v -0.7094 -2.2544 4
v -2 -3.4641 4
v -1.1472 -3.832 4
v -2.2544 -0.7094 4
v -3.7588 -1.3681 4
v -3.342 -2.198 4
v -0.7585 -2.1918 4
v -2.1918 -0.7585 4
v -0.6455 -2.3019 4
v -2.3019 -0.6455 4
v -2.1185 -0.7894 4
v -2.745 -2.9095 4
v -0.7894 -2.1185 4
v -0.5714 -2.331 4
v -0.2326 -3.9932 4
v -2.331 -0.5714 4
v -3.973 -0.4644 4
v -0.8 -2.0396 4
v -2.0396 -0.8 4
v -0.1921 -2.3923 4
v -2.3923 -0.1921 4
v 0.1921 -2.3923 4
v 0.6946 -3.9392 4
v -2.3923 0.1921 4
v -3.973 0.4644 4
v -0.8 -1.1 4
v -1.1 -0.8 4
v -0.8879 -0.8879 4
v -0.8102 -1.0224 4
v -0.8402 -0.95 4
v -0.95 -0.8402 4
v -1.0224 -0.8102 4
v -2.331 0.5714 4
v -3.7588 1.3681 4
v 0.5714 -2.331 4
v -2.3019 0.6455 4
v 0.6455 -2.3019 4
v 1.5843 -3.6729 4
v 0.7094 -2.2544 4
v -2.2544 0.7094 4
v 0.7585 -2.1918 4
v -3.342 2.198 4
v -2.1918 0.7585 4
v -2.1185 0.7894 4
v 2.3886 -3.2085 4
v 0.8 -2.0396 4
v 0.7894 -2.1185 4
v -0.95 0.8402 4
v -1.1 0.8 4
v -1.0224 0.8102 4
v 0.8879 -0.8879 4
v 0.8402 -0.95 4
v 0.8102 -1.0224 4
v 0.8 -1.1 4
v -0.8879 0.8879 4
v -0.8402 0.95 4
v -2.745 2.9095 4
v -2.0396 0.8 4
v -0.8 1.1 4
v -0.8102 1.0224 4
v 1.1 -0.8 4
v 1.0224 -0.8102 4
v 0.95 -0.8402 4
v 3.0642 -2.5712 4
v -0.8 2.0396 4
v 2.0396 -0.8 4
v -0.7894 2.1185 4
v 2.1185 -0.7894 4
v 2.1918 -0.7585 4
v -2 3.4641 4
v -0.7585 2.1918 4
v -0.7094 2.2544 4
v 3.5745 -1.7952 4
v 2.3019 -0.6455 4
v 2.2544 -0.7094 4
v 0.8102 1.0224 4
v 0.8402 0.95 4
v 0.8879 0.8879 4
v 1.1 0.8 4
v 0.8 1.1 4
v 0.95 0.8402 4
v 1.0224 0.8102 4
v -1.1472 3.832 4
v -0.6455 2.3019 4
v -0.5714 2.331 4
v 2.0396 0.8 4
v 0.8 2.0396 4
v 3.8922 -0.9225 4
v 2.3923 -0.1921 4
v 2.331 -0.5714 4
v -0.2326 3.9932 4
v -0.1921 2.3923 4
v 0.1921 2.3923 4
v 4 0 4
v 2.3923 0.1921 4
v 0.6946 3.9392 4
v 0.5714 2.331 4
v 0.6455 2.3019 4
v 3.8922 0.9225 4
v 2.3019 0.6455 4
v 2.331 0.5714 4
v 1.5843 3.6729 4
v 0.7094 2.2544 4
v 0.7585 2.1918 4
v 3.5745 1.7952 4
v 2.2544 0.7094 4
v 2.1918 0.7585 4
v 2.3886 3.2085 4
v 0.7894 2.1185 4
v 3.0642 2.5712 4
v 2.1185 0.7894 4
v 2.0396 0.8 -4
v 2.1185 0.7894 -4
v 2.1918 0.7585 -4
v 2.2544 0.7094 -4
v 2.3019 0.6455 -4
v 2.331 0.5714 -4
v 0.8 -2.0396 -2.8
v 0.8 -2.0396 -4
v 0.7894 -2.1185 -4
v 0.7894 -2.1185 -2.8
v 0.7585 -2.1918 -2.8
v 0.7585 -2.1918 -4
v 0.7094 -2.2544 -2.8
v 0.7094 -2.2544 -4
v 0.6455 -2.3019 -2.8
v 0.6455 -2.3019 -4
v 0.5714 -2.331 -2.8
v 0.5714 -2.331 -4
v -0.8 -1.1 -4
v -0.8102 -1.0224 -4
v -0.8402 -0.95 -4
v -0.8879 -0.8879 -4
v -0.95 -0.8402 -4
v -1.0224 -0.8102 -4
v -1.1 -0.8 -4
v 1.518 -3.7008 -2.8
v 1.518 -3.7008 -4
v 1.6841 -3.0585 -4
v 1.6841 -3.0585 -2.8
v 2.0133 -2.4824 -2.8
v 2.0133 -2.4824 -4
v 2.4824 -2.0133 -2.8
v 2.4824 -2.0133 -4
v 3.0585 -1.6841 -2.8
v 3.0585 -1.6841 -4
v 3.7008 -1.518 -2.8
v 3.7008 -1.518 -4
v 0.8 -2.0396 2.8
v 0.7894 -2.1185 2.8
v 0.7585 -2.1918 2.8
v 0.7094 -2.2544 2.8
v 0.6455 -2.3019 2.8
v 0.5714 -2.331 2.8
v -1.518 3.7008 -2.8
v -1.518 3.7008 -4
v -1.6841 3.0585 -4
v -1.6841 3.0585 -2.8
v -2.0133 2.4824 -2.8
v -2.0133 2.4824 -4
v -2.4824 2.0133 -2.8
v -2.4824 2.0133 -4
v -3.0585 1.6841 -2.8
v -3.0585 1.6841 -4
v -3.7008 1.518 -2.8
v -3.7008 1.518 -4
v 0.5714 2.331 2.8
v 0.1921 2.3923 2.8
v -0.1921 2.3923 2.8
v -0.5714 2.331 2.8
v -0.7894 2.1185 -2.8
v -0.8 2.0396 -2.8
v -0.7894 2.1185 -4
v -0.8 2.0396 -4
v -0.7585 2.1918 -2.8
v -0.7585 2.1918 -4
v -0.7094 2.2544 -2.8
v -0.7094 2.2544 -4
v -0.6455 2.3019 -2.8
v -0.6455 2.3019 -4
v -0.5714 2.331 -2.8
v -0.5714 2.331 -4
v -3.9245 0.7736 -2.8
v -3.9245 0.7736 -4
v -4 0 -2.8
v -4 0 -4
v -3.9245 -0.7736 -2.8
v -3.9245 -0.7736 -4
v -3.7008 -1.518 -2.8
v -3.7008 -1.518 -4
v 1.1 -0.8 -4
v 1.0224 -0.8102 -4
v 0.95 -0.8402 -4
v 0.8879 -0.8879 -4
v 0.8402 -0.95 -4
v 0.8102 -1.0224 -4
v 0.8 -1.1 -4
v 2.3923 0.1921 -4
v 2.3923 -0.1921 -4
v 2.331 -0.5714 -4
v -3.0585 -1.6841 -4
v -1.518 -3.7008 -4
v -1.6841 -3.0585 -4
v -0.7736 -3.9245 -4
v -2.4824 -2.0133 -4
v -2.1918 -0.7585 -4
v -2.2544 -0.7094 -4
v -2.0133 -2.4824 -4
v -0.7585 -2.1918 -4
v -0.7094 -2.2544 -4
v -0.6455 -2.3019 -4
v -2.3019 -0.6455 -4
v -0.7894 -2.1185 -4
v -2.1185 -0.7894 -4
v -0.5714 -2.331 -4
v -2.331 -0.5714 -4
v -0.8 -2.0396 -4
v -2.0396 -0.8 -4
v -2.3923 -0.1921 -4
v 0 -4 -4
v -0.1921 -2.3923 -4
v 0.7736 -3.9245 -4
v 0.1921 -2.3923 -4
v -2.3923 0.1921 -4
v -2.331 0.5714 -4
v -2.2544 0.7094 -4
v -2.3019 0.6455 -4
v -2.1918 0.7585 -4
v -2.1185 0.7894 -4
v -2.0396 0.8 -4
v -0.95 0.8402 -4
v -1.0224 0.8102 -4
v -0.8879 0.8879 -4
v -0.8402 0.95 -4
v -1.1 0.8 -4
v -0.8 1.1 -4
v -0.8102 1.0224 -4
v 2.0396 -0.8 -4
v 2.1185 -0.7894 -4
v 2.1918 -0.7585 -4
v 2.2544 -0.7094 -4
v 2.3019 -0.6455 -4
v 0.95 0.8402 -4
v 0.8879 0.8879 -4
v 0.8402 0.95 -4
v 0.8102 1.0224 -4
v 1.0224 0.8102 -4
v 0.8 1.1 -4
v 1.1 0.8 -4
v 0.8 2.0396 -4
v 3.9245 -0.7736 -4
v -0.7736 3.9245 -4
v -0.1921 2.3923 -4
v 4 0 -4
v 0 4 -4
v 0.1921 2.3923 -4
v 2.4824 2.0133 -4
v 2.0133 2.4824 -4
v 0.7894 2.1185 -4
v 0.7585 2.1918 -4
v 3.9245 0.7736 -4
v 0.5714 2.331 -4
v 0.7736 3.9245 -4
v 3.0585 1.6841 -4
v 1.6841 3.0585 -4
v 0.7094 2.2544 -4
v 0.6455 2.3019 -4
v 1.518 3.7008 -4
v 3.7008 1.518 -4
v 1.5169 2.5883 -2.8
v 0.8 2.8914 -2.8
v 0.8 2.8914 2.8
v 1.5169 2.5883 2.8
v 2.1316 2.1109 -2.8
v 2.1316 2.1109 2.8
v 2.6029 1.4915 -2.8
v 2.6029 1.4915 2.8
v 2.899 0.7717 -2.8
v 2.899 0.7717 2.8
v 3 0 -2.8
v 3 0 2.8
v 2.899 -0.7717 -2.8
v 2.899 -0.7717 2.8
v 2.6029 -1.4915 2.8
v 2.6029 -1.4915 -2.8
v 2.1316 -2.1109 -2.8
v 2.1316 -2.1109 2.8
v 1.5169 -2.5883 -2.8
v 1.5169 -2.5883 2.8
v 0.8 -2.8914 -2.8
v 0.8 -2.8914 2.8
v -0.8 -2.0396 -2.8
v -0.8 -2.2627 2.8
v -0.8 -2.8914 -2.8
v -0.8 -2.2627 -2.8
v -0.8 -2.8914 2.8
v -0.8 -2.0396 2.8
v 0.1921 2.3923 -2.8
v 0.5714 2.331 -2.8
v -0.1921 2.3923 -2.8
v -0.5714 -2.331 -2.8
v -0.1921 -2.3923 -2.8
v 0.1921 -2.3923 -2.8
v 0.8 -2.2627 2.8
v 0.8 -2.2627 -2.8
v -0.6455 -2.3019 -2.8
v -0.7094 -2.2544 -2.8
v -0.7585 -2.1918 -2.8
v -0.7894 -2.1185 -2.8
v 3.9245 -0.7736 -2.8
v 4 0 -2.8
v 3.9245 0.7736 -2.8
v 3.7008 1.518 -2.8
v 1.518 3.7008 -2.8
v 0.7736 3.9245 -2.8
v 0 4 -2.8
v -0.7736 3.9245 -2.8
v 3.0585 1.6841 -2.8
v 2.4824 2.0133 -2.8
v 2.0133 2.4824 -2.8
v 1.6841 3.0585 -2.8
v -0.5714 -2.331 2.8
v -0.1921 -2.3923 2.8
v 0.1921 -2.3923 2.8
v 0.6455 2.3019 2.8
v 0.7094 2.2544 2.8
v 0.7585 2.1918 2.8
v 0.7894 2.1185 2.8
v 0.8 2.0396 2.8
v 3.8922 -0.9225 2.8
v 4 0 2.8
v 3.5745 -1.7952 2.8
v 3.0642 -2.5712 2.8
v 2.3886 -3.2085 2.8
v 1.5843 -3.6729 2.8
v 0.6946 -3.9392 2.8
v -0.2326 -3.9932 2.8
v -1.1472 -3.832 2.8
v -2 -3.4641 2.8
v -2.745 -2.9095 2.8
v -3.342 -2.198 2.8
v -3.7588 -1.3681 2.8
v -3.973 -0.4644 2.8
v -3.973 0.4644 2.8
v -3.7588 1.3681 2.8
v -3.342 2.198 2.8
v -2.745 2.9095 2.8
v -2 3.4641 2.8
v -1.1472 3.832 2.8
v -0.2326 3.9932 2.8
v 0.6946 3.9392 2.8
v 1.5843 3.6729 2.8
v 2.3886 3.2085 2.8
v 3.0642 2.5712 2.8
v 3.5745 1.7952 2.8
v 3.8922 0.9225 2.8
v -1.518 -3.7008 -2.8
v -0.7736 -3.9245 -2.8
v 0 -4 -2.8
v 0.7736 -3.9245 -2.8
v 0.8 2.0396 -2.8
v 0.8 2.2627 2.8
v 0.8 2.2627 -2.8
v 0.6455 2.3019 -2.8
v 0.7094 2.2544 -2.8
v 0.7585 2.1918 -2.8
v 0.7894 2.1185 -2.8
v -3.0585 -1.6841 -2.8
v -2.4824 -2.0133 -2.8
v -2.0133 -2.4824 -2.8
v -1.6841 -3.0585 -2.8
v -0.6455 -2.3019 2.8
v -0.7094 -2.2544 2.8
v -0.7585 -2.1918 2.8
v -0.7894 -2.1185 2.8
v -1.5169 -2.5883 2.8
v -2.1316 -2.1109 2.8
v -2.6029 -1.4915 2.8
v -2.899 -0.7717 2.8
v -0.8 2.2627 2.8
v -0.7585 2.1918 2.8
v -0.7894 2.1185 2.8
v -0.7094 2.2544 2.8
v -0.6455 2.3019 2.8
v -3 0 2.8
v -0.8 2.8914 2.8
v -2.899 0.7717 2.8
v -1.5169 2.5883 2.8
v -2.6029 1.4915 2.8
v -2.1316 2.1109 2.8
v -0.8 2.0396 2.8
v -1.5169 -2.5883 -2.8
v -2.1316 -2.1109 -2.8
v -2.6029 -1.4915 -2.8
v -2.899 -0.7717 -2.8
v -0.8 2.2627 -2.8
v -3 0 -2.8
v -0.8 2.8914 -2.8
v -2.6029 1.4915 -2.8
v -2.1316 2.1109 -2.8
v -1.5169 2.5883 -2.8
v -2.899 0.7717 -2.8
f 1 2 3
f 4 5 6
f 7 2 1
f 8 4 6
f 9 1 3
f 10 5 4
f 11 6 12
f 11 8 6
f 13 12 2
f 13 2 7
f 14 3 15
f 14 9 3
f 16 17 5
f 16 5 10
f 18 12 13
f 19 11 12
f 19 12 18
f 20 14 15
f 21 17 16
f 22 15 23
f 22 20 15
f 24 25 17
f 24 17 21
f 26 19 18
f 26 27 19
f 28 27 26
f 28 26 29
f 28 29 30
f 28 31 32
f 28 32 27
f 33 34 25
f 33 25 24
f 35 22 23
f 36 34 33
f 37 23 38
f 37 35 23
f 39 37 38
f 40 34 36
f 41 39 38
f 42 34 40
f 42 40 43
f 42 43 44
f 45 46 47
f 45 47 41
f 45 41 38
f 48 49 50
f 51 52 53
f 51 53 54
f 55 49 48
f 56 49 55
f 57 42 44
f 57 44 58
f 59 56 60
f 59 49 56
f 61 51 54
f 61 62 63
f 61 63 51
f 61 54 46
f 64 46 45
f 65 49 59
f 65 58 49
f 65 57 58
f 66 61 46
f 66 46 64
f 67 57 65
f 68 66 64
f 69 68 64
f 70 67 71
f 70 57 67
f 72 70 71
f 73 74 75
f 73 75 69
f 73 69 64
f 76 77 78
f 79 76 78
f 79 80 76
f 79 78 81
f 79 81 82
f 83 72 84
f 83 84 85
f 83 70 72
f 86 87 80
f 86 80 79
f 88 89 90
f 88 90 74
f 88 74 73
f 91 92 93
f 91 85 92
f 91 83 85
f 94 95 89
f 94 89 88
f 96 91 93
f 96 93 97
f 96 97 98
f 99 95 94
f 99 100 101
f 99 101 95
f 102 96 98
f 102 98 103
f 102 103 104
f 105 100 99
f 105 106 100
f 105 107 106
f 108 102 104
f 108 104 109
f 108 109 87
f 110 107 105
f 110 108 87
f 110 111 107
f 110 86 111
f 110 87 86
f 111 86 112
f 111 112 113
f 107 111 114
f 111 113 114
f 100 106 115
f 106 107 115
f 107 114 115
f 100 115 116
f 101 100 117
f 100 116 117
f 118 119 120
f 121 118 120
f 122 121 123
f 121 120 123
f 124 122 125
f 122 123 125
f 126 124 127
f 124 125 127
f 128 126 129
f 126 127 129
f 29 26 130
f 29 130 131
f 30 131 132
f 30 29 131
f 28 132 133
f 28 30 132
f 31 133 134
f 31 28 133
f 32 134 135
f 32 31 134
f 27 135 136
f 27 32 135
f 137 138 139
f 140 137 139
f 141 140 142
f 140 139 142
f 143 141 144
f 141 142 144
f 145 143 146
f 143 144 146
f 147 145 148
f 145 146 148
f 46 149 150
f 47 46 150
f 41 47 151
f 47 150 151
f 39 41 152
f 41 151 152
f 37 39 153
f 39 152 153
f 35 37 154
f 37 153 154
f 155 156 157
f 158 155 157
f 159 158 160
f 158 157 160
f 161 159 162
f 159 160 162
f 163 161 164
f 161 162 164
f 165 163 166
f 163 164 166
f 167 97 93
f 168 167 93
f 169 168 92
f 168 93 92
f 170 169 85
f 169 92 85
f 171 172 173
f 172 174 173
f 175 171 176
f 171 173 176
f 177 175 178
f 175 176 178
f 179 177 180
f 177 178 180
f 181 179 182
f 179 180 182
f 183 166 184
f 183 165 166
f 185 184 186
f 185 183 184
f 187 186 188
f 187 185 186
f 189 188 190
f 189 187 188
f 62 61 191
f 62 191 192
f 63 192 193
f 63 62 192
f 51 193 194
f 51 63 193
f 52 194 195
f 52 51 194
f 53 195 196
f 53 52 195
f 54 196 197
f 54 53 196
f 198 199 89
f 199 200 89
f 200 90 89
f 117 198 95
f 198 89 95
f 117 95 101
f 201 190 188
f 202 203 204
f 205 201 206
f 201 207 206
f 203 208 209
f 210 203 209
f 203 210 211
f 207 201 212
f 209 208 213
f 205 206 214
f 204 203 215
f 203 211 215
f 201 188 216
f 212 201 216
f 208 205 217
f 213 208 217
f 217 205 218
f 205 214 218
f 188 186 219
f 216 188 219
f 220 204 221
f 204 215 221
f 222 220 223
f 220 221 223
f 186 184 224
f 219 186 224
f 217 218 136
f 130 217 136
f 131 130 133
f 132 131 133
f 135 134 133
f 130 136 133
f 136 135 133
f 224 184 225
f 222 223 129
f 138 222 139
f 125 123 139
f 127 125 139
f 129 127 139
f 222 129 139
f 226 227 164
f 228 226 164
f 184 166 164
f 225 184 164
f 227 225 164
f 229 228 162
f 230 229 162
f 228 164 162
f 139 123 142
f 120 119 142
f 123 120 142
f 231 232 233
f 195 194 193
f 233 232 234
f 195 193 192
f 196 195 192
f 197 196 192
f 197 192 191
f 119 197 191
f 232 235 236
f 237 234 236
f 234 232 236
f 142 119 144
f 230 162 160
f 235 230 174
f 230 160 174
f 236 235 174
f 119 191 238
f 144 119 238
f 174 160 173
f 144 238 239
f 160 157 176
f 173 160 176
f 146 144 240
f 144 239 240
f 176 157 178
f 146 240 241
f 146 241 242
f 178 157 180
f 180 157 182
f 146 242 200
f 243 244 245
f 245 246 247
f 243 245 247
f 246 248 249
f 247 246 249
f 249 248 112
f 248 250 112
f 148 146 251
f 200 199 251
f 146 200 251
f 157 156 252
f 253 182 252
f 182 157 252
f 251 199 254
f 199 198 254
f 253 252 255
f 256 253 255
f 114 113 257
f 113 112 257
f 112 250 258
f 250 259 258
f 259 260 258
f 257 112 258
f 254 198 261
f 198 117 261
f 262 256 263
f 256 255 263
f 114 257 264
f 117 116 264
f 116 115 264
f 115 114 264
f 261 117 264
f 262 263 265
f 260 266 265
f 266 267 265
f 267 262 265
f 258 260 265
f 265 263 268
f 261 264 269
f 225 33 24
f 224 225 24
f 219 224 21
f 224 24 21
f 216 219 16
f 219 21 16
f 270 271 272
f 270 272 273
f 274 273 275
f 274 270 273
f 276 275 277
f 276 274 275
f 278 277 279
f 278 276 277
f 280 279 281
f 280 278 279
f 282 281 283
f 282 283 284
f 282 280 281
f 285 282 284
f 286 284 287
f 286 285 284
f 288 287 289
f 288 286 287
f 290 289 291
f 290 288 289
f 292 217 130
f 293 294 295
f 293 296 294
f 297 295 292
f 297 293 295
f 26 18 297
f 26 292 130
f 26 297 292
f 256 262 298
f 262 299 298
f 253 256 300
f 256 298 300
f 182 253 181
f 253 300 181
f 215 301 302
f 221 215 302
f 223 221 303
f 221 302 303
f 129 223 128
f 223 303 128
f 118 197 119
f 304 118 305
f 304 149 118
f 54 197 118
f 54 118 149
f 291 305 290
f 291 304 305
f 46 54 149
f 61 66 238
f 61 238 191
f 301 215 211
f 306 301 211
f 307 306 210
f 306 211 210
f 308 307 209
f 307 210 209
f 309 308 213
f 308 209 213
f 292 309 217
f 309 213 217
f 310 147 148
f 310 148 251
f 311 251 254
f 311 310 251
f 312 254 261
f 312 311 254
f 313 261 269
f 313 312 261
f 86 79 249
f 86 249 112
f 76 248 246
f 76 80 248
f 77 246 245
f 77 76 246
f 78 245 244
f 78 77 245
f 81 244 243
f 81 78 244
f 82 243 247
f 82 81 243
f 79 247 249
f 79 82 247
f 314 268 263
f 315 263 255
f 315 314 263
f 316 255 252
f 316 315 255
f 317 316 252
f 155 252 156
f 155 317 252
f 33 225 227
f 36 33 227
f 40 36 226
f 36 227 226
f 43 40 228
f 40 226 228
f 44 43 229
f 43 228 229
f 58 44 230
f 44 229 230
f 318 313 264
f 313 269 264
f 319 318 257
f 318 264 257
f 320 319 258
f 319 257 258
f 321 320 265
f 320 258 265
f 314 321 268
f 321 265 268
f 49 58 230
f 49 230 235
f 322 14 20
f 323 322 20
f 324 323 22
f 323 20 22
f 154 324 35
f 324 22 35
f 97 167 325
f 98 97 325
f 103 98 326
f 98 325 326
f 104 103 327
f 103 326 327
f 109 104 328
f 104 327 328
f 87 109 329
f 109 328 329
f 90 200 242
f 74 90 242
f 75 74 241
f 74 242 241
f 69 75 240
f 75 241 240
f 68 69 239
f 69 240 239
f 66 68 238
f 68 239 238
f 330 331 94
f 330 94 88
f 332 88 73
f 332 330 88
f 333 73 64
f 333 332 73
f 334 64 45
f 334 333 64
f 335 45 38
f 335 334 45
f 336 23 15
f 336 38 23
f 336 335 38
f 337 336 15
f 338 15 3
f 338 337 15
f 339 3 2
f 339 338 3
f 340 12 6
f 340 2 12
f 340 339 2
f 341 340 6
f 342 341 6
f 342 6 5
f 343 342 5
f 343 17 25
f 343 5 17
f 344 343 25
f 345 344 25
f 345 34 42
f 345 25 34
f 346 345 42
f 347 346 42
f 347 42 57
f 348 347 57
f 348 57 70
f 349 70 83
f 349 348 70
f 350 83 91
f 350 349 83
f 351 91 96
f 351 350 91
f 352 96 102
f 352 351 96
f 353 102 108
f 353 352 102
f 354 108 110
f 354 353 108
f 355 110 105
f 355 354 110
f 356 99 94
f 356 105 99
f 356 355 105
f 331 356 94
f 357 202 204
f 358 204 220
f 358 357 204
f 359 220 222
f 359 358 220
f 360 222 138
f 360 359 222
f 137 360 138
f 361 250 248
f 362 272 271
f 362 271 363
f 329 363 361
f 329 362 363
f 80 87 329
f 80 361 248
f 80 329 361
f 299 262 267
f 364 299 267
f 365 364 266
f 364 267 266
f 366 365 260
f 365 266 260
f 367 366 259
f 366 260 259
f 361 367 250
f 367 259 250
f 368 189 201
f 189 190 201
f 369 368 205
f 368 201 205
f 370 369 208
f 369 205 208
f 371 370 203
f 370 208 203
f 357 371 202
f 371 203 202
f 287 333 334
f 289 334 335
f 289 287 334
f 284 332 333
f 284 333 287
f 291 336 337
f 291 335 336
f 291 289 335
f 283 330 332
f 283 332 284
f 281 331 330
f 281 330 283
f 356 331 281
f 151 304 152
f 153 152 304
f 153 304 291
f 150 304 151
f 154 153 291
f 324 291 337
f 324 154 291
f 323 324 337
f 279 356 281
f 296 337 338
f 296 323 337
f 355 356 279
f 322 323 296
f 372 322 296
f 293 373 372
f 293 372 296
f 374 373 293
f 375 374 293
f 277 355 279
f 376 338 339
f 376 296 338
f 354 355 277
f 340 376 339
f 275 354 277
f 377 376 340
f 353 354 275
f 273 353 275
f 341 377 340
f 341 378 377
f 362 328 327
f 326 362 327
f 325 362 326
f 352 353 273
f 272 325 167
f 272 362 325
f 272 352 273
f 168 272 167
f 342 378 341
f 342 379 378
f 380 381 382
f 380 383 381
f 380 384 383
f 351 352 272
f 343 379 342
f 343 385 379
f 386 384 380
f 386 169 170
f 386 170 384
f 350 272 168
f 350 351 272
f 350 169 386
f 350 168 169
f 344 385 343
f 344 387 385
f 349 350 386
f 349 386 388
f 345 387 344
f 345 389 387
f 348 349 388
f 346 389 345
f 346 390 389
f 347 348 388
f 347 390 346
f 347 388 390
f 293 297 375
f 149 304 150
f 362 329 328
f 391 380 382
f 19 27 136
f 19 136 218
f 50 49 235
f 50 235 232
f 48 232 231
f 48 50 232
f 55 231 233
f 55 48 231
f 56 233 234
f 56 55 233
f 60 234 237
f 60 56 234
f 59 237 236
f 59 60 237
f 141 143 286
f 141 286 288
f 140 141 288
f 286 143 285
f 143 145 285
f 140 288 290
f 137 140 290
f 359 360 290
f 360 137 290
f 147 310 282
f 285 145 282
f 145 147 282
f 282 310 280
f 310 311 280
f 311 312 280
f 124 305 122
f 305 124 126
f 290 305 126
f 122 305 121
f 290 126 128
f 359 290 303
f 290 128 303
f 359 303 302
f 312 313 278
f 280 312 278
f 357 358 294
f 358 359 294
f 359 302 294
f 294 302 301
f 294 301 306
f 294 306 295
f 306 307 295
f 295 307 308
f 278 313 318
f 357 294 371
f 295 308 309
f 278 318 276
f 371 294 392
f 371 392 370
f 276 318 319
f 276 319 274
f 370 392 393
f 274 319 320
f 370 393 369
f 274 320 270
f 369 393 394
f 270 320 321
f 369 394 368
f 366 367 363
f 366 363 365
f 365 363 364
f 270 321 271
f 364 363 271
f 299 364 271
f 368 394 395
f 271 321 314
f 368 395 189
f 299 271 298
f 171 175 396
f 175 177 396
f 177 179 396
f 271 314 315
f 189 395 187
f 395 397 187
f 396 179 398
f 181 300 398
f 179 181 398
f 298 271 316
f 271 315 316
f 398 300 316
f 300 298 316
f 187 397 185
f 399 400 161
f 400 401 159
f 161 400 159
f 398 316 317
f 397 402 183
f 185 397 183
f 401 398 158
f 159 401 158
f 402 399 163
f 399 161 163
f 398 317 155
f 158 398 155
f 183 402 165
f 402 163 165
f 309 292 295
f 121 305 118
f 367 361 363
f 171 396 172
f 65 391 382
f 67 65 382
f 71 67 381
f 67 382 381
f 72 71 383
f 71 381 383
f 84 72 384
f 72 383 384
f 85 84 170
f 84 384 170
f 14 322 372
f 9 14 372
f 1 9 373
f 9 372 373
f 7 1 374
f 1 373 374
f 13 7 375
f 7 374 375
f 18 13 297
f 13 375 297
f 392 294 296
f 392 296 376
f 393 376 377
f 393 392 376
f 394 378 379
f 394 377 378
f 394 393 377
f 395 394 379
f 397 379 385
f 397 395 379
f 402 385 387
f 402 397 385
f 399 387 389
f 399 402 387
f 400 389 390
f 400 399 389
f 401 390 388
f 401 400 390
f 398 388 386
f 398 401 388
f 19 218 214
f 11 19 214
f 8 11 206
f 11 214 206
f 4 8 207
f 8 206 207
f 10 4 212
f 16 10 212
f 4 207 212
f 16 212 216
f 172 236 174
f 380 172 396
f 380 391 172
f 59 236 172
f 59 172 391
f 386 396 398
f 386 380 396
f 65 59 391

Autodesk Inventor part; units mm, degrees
ref_plane "YZ Plane" through (0, 0, 0) normal (1, 0, 0) x (0, 1, 0)
ref_plane "XZ Plane" through (0, 0, 0) normal (0, 1, 0) x (-1, 0, 0)
sketch "Sketch1" plane through (0, 0, 0) normal (0, 0, 1) x (1, 0, 0)
  circle A0 centre (0, 0) radius 4
  dimension "d0" = 8
extrude "Extrusion1" add sketch "Sketch1" along normal mid plane 8
sketch "Sketch2" plane through (0, 0, 4) normal (0, 0, 1) x (1, 0, 0)
  circle A0 centre (0, 0) radius 2.4
  line L0 (-2.2627, 0.8) -> (-0.8, 0.8)
  line L1 (-0.8, 0.8) -> (-0.8, 2.2627)
  line L2 (0.8, 2.2627) -> (0.8, 0.8)
  line L3 (0.8, 0.8) -> (2.2627, 0.8)
  line L4 (2.2627, -0.8) -> (0.8, -0.8)
  line L5 (0.8, -0.8) -> (0.8, -2.2627)
  line L6 (-0.8, -2.2627) -> (-0.8, -0.8)
  line L7 (-0.8, -0.8) -> (-2.2627, -0.8)
  dimension "d3" = 4.8
  dimension "d4" = 1.6
extrude "Extrusion2" cut sketch "Sketch2" against normal through all contours A0 L4 L5 L6 L7 L0 L1 L2 L3
ref_plane "Work Plane1" through (0, 0, -2.8) normal (0, 0, -1) x (-1, 0, 0)
sketch "Sketch3" plane through (0, 0, -2.8) normal (0, 0, -1) x (-1, 0, 0)
  circle A0 centre (0, 0) radius 4 projected
  circle A1 centre (0, 0) radius 4 projected
  circle A2 centre (0, 0) radius 3
  dimension "d8" = 6
extrude "Extrusion3" cut sketch "Sketch3" against normal blind 5.6
sketch "Sketch4" plane through (0, 0, -4) normal (0, 0, -1) x (-1, 0, 0)
  circle A0 centre (4, -4) radius 2.5
  point P0 (0, 0)
  dimension "d11" = 4
  dimension "d12" = 4
  dimension "d13" = 5
extrude "Extrusion4" cut sketch "Sketch4" against normal up to surface (1.2 mm away)
pattern_circular "Circular Pattern1" count 4 over 360 about axis through (0, 0, -10) along (0, 0, 1) of "Extrusion4"
sketch "Sketch5" plane through (0, 0, 0) normal (0, 1, 0) x (-1, 0, 0)
  line L0 (-0.8, 4) -> (-0.8, -4) projected
  line L1 (0.8, 4) -> (0.8, -4) projected
  line L2 (4, 2.8) -> (-4, 2.8) projected
  line L3 (-1.518, -2.8) -> (1.518, -2.8) projected
  line L4 (-0.8, -2.8) -> (0.8, -2.8)
  line L5 (0.8, -2.8) -> (0.8, 2.8)
  line L6 (0.8, 2.8) -> (-0.8, 2.8)
  line L7 (-0.8, 2.8) -> (-0.8, -2.8)
  point P0 (0, 0)
extrude "Extrusion5" cut sketch "Sketch5" along normal through all both and the other way through all
fillet "Fillet1" radius 0.3 16 edges at (-0.8, 0.8, 0) (-0.8, -0.8, 0) (0.8, -0.8, 0) (0.8, 0.8, 0) (-2.2627, -0.8, 0) (-2.2627, 0.8, 0) (-0.8, 2.2627, 3.4) (0.8, 2.2627, 3.4) (2.2627, 0.8, 0) (2.2627, -0.8, 0) (0.8, -2.2627, 3.4) (-0.8, -2.2627, 3.4) (0.8, 2.2627, -3.4) (-0.8, 2.2627, -3.4) (0.8, -2.2627, -3.4) (-0.8, -2.2627, -3.4)
properties part number "3713" material "Steel"
